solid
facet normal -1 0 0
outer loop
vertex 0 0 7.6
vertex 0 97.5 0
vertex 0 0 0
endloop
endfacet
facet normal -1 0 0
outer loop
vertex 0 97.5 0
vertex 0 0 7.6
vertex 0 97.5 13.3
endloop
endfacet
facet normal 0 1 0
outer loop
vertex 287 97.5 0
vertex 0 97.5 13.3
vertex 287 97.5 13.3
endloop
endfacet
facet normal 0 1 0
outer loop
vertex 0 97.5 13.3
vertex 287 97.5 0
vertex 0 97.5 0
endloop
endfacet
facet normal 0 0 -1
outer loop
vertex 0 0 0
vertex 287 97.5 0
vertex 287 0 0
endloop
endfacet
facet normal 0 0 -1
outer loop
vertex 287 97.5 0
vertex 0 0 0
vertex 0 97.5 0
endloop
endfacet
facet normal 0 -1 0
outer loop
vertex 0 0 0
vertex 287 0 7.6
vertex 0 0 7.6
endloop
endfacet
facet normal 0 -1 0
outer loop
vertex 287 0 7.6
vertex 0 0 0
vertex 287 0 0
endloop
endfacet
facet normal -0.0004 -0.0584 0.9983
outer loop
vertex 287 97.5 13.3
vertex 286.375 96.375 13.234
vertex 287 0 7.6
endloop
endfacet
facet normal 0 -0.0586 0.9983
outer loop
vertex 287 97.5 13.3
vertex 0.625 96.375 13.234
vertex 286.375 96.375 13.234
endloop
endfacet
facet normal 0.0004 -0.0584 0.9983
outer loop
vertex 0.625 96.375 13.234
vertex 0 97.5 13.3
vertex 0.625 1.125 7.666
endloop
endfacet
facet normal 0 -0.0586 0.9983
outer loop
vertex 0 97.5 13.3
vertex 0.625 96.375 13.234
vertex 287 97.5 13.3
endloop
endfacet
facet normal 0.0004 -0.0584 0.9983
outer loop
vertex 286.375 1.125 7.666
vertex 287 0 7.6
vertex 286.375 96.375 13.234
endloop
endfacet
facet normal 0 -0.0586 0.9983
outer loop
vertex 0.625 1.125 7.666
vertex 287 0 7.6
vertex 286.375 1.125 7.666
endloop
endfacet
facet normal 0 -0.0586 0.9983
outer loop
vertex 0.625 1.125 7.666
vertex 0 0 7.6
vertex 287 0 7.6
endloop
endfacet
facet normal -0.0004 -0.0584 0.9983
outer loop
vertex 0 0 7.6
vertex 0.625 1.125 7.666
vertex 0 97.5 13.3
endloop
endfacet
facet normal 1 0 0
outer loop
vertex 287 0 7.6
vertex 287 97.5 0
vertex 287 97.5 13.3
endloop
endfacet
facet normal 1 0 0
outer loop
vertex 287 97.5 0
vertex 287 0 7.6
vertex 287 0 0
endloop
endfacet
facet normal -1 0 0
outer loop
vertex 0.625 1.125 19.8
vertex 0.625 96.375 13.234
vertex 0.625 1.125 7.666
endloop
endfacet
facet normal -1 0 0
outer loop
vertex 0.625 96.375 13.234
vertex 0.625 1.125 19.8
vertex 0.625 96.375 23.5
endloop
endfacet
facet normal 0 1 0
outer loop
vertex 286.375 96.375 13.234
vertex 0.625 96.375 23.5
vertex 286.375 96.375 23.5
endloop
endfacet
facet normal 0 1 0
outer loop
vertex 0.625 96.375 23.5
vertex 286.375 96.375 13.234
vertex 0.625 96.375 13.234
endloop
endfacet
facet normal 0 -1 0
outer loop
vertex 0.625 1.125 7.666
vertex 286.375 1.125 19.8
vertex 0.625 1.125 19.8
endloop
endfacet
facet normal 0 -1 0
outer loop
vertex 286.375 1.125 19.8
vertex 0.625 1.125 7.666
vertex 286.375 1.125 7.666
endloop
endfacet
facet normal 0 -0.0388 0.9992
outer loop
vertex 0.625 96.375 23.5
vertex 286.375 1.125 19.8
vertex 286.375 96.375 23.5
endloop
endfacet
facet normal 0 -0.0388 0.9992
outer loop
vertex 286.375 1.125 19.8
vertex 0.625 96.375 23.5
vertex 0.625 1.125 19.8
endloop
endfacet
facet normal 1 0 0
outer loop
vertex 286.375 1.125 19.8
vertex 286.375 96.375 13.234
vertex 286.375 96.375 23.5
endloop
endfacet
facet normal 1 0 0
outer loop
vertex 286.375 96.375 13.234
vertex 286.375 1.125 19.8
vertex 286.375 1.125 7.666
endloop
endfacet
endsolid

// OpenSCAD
// keyboard_blank.scad - a parametric stand-in for the Keychron K9 Pro.
//
// WHAT THIS IS
//   A volume to design the v2 enclosure around, not a model of a keyboard.
//   No keycaps, no switches, no ports, no feet - just the envelope the shell
//   has to clear. Keycaps are deliberately not modelled: a bay needs to know
//   how far the key band stands proud of the case, which is one number, not
//   61 solids.
//
// GEOMETRY, IN ONE PARAGRAPH
//   The K9 Pro has a FLAT BOTTOM and a WEDGED TOP. Keychron publishes the
//   case height at the front edge (7.6) and at the rear edge (13.3); both are
//   measured from the surface the keyboard rests on, so the underside is the
//   datum plane and the slope lives in the top shell. A flat pocket floor is
//   therefore correct - see the note on v2/research/keyboard.md's bay caveat
//   in v2/research/keyboard-k9pro-model.md section 6.
//
// SOURCING
//   Every default below is tagged. Tags used:
//     [vendor]    published by Keychron on the K9 Pro product page
//     [derived]   computed here from [vendor] or [qmk] numbers, arithmetic shown
//     [qmk]       from the K9 Pro QMK keyboard definition (key positions)
//     [UNSOURCED] NOT a measurement. Guarded default. Get the calipers.
//   Provenance and the full argument: v2/research/keyboard-k9pro-model.md
//
// RENDER
//   openscad -D 'part="envelope"' -o blank.stl v2/cad/keyboard_blank.scad
//   An empty or tiny mesh is a failure symptom, not a quiet pass.

// ---------------------------------------------------------------- parameters

// Outside footprint of the keyboard as it ships (ABS + aluminium frame; there
// is no plastic-frame variant of the K9 Pro).
kb_w       = 287.0;   // [vendor] width,  across the keyboard
kb_d       = 97.5;    // [vendor] depth,  front-to-back, drives deck height

// Case height at the two edges, from the resting plane, WITHOUT keycaps.
kb_h_front = 7.6;     // [vendor]
kb_h_rear  = 13.3;    // [vendor]

// How far the keycap tops stand above the resting plane, at each edge.
// The rear figure is corroborated twice (see research doc section 4); the
// FRONT figure is the weakest number in this file - two defensible routes
// disagree by 2.8 mm. The larger value is used, because for an aperture an
// over-estimate costs clearance and an under-estimate costs a reprint.
kc_top_front = 19.8;  // [vendor-page, third-party] CONTESTED: 17.0 by the other route
kc_top_rear  = 23.5;  // [vendor-page, third-party] corroborated to within 0.2

// Switch field (the key band that must come through an aperture).
// 15 u x 5 u at 19.05 mm pitch, from the 61-key ANSI QMK layout.
field_w = 15 * 19.05; // [derived from qmk] = 285.75
field_d =  5 * 19.05; // [derived from qmk] =  95.25

// Corner radius of the outside footprint.
// DEFAULT 0 IS DELIBERATE: a sharp-cornered blank is the largest, and so the
// safest, envelope, and the real radius is not published. Set it once measured.
corner_r = 0;         // [UNSOURCED] real board has some radius; 0 = conservative

// Clearance to add all round when this blank is used to cut a pocket. Left at
// 0 here so the blank is the keyboard, not the pocket; v1's rule was +1.35 on
// width and +0.95 on depth (cad/parameters.scad:748-749).
clearance = 0;

// part = "envelope" | "shell" | "keycaps"
//   envelope - everything the keyboard occupies. Use this to cut a bay.
//   shell    - the case body only. This is what sits down in the pocket.
//   keycaps  - the band that must stand proud through the aperture.
part = "envelope";

// ------------------------------------------------------------------- derived

// The frame around the switch field, per side. Note how small this comes out:
// the K9 Pro is very nearly a bare 60% plate with a lip. That thinness is
// real but it is derived, not measured - it is on the calipers list.
bezel_x = (kb_w - field_w) / 2;   // = (287    - 285.75) / 2 = 0.625
bezel_y = (kb_d - field_d) / 2;   // = ( 97.5  -  95.25) / 2 = 1.125

// Top-shell wedge angle. Comes out at 3.35 deg, which is what Keychron
// publishes as the no-feet typing angle (3.4 deg) - an independent check that
// these three numbers belong to the same object.
wedge_deg = atan((kb_h_rear - kb_h_front) / kb_d);

// ------------------------------------------------------------------- modules

// A flat-bottomed solid whose top slopes linearly from h_front at y=0 to
// h_rear at y=d. Built by extruding the side profile, so the top face is
// exactly planar and the solid is manifold by construction.
module wedge(w, d, h_front, h_rear, r = 0) {
    if (r > 0) {
        // Rounded footprint: intersect the wedge with a rounded-corner prism.
        intersection() {
            wedge(w, d, h_front, h_rear, 0);
            linear_extrude(height = max(h_front, h_rear) + 1)
                offset(r = r) offset(r = -r) square([w, d]);
        }
    } else {
        // rotate([90,0,90]) maps local (a,b,c) -> (c,a,b): the profile's x
        // becomes depth, its y becomes height, the extrusion becomes width.
        rotate([90, 0, 90])
            linear_extrude(height = w)
                polygon([[0, 0], [d, 0], [d, h_rear], [0, h_front]]);
    }
}

// The case body: full footprint, no keycaps.
module kb_shell() {
    wedge(kb_w + 2*clearance, kb_d + 2*clearance,
          kb_h_front, kb_h_rear, corner_r);
}

// The keycap band: inset to the switch field, standing from the resting plane
// up to the keycap tops. Modelled from z=0 (not from the shell top) so that
// unioning it with the shell gives a closed envelope with no seam.
module kb_keycaps() {
    translate([bezel_x, bezel_y, 0])
        wedge(field_w, field_d, kc_top_front, kc_top_rear, 0);
}

// Everything the keyboard occupies.
module kb_envelope() {
    union() {
        kb_shell();
        kb_keycaps();
    }
}

// ---------------------------------------------------------------------- main

if (part == "envelope")     kb_envelope();
else if (part == "shell")   kb_shell();
else if (part == "keycaps") kb_keycaps();
else assert(false, "part must be envelope, shell or keycaps");

echo(str("kb_w=", kb_w, " kb_d=", kb_d,
         " wedge_deg=", wedge_deg,
         " bezel_x=", bezel_x, " bezel_y=", bezel_y,
         " tallest=", kc_top_rear));
